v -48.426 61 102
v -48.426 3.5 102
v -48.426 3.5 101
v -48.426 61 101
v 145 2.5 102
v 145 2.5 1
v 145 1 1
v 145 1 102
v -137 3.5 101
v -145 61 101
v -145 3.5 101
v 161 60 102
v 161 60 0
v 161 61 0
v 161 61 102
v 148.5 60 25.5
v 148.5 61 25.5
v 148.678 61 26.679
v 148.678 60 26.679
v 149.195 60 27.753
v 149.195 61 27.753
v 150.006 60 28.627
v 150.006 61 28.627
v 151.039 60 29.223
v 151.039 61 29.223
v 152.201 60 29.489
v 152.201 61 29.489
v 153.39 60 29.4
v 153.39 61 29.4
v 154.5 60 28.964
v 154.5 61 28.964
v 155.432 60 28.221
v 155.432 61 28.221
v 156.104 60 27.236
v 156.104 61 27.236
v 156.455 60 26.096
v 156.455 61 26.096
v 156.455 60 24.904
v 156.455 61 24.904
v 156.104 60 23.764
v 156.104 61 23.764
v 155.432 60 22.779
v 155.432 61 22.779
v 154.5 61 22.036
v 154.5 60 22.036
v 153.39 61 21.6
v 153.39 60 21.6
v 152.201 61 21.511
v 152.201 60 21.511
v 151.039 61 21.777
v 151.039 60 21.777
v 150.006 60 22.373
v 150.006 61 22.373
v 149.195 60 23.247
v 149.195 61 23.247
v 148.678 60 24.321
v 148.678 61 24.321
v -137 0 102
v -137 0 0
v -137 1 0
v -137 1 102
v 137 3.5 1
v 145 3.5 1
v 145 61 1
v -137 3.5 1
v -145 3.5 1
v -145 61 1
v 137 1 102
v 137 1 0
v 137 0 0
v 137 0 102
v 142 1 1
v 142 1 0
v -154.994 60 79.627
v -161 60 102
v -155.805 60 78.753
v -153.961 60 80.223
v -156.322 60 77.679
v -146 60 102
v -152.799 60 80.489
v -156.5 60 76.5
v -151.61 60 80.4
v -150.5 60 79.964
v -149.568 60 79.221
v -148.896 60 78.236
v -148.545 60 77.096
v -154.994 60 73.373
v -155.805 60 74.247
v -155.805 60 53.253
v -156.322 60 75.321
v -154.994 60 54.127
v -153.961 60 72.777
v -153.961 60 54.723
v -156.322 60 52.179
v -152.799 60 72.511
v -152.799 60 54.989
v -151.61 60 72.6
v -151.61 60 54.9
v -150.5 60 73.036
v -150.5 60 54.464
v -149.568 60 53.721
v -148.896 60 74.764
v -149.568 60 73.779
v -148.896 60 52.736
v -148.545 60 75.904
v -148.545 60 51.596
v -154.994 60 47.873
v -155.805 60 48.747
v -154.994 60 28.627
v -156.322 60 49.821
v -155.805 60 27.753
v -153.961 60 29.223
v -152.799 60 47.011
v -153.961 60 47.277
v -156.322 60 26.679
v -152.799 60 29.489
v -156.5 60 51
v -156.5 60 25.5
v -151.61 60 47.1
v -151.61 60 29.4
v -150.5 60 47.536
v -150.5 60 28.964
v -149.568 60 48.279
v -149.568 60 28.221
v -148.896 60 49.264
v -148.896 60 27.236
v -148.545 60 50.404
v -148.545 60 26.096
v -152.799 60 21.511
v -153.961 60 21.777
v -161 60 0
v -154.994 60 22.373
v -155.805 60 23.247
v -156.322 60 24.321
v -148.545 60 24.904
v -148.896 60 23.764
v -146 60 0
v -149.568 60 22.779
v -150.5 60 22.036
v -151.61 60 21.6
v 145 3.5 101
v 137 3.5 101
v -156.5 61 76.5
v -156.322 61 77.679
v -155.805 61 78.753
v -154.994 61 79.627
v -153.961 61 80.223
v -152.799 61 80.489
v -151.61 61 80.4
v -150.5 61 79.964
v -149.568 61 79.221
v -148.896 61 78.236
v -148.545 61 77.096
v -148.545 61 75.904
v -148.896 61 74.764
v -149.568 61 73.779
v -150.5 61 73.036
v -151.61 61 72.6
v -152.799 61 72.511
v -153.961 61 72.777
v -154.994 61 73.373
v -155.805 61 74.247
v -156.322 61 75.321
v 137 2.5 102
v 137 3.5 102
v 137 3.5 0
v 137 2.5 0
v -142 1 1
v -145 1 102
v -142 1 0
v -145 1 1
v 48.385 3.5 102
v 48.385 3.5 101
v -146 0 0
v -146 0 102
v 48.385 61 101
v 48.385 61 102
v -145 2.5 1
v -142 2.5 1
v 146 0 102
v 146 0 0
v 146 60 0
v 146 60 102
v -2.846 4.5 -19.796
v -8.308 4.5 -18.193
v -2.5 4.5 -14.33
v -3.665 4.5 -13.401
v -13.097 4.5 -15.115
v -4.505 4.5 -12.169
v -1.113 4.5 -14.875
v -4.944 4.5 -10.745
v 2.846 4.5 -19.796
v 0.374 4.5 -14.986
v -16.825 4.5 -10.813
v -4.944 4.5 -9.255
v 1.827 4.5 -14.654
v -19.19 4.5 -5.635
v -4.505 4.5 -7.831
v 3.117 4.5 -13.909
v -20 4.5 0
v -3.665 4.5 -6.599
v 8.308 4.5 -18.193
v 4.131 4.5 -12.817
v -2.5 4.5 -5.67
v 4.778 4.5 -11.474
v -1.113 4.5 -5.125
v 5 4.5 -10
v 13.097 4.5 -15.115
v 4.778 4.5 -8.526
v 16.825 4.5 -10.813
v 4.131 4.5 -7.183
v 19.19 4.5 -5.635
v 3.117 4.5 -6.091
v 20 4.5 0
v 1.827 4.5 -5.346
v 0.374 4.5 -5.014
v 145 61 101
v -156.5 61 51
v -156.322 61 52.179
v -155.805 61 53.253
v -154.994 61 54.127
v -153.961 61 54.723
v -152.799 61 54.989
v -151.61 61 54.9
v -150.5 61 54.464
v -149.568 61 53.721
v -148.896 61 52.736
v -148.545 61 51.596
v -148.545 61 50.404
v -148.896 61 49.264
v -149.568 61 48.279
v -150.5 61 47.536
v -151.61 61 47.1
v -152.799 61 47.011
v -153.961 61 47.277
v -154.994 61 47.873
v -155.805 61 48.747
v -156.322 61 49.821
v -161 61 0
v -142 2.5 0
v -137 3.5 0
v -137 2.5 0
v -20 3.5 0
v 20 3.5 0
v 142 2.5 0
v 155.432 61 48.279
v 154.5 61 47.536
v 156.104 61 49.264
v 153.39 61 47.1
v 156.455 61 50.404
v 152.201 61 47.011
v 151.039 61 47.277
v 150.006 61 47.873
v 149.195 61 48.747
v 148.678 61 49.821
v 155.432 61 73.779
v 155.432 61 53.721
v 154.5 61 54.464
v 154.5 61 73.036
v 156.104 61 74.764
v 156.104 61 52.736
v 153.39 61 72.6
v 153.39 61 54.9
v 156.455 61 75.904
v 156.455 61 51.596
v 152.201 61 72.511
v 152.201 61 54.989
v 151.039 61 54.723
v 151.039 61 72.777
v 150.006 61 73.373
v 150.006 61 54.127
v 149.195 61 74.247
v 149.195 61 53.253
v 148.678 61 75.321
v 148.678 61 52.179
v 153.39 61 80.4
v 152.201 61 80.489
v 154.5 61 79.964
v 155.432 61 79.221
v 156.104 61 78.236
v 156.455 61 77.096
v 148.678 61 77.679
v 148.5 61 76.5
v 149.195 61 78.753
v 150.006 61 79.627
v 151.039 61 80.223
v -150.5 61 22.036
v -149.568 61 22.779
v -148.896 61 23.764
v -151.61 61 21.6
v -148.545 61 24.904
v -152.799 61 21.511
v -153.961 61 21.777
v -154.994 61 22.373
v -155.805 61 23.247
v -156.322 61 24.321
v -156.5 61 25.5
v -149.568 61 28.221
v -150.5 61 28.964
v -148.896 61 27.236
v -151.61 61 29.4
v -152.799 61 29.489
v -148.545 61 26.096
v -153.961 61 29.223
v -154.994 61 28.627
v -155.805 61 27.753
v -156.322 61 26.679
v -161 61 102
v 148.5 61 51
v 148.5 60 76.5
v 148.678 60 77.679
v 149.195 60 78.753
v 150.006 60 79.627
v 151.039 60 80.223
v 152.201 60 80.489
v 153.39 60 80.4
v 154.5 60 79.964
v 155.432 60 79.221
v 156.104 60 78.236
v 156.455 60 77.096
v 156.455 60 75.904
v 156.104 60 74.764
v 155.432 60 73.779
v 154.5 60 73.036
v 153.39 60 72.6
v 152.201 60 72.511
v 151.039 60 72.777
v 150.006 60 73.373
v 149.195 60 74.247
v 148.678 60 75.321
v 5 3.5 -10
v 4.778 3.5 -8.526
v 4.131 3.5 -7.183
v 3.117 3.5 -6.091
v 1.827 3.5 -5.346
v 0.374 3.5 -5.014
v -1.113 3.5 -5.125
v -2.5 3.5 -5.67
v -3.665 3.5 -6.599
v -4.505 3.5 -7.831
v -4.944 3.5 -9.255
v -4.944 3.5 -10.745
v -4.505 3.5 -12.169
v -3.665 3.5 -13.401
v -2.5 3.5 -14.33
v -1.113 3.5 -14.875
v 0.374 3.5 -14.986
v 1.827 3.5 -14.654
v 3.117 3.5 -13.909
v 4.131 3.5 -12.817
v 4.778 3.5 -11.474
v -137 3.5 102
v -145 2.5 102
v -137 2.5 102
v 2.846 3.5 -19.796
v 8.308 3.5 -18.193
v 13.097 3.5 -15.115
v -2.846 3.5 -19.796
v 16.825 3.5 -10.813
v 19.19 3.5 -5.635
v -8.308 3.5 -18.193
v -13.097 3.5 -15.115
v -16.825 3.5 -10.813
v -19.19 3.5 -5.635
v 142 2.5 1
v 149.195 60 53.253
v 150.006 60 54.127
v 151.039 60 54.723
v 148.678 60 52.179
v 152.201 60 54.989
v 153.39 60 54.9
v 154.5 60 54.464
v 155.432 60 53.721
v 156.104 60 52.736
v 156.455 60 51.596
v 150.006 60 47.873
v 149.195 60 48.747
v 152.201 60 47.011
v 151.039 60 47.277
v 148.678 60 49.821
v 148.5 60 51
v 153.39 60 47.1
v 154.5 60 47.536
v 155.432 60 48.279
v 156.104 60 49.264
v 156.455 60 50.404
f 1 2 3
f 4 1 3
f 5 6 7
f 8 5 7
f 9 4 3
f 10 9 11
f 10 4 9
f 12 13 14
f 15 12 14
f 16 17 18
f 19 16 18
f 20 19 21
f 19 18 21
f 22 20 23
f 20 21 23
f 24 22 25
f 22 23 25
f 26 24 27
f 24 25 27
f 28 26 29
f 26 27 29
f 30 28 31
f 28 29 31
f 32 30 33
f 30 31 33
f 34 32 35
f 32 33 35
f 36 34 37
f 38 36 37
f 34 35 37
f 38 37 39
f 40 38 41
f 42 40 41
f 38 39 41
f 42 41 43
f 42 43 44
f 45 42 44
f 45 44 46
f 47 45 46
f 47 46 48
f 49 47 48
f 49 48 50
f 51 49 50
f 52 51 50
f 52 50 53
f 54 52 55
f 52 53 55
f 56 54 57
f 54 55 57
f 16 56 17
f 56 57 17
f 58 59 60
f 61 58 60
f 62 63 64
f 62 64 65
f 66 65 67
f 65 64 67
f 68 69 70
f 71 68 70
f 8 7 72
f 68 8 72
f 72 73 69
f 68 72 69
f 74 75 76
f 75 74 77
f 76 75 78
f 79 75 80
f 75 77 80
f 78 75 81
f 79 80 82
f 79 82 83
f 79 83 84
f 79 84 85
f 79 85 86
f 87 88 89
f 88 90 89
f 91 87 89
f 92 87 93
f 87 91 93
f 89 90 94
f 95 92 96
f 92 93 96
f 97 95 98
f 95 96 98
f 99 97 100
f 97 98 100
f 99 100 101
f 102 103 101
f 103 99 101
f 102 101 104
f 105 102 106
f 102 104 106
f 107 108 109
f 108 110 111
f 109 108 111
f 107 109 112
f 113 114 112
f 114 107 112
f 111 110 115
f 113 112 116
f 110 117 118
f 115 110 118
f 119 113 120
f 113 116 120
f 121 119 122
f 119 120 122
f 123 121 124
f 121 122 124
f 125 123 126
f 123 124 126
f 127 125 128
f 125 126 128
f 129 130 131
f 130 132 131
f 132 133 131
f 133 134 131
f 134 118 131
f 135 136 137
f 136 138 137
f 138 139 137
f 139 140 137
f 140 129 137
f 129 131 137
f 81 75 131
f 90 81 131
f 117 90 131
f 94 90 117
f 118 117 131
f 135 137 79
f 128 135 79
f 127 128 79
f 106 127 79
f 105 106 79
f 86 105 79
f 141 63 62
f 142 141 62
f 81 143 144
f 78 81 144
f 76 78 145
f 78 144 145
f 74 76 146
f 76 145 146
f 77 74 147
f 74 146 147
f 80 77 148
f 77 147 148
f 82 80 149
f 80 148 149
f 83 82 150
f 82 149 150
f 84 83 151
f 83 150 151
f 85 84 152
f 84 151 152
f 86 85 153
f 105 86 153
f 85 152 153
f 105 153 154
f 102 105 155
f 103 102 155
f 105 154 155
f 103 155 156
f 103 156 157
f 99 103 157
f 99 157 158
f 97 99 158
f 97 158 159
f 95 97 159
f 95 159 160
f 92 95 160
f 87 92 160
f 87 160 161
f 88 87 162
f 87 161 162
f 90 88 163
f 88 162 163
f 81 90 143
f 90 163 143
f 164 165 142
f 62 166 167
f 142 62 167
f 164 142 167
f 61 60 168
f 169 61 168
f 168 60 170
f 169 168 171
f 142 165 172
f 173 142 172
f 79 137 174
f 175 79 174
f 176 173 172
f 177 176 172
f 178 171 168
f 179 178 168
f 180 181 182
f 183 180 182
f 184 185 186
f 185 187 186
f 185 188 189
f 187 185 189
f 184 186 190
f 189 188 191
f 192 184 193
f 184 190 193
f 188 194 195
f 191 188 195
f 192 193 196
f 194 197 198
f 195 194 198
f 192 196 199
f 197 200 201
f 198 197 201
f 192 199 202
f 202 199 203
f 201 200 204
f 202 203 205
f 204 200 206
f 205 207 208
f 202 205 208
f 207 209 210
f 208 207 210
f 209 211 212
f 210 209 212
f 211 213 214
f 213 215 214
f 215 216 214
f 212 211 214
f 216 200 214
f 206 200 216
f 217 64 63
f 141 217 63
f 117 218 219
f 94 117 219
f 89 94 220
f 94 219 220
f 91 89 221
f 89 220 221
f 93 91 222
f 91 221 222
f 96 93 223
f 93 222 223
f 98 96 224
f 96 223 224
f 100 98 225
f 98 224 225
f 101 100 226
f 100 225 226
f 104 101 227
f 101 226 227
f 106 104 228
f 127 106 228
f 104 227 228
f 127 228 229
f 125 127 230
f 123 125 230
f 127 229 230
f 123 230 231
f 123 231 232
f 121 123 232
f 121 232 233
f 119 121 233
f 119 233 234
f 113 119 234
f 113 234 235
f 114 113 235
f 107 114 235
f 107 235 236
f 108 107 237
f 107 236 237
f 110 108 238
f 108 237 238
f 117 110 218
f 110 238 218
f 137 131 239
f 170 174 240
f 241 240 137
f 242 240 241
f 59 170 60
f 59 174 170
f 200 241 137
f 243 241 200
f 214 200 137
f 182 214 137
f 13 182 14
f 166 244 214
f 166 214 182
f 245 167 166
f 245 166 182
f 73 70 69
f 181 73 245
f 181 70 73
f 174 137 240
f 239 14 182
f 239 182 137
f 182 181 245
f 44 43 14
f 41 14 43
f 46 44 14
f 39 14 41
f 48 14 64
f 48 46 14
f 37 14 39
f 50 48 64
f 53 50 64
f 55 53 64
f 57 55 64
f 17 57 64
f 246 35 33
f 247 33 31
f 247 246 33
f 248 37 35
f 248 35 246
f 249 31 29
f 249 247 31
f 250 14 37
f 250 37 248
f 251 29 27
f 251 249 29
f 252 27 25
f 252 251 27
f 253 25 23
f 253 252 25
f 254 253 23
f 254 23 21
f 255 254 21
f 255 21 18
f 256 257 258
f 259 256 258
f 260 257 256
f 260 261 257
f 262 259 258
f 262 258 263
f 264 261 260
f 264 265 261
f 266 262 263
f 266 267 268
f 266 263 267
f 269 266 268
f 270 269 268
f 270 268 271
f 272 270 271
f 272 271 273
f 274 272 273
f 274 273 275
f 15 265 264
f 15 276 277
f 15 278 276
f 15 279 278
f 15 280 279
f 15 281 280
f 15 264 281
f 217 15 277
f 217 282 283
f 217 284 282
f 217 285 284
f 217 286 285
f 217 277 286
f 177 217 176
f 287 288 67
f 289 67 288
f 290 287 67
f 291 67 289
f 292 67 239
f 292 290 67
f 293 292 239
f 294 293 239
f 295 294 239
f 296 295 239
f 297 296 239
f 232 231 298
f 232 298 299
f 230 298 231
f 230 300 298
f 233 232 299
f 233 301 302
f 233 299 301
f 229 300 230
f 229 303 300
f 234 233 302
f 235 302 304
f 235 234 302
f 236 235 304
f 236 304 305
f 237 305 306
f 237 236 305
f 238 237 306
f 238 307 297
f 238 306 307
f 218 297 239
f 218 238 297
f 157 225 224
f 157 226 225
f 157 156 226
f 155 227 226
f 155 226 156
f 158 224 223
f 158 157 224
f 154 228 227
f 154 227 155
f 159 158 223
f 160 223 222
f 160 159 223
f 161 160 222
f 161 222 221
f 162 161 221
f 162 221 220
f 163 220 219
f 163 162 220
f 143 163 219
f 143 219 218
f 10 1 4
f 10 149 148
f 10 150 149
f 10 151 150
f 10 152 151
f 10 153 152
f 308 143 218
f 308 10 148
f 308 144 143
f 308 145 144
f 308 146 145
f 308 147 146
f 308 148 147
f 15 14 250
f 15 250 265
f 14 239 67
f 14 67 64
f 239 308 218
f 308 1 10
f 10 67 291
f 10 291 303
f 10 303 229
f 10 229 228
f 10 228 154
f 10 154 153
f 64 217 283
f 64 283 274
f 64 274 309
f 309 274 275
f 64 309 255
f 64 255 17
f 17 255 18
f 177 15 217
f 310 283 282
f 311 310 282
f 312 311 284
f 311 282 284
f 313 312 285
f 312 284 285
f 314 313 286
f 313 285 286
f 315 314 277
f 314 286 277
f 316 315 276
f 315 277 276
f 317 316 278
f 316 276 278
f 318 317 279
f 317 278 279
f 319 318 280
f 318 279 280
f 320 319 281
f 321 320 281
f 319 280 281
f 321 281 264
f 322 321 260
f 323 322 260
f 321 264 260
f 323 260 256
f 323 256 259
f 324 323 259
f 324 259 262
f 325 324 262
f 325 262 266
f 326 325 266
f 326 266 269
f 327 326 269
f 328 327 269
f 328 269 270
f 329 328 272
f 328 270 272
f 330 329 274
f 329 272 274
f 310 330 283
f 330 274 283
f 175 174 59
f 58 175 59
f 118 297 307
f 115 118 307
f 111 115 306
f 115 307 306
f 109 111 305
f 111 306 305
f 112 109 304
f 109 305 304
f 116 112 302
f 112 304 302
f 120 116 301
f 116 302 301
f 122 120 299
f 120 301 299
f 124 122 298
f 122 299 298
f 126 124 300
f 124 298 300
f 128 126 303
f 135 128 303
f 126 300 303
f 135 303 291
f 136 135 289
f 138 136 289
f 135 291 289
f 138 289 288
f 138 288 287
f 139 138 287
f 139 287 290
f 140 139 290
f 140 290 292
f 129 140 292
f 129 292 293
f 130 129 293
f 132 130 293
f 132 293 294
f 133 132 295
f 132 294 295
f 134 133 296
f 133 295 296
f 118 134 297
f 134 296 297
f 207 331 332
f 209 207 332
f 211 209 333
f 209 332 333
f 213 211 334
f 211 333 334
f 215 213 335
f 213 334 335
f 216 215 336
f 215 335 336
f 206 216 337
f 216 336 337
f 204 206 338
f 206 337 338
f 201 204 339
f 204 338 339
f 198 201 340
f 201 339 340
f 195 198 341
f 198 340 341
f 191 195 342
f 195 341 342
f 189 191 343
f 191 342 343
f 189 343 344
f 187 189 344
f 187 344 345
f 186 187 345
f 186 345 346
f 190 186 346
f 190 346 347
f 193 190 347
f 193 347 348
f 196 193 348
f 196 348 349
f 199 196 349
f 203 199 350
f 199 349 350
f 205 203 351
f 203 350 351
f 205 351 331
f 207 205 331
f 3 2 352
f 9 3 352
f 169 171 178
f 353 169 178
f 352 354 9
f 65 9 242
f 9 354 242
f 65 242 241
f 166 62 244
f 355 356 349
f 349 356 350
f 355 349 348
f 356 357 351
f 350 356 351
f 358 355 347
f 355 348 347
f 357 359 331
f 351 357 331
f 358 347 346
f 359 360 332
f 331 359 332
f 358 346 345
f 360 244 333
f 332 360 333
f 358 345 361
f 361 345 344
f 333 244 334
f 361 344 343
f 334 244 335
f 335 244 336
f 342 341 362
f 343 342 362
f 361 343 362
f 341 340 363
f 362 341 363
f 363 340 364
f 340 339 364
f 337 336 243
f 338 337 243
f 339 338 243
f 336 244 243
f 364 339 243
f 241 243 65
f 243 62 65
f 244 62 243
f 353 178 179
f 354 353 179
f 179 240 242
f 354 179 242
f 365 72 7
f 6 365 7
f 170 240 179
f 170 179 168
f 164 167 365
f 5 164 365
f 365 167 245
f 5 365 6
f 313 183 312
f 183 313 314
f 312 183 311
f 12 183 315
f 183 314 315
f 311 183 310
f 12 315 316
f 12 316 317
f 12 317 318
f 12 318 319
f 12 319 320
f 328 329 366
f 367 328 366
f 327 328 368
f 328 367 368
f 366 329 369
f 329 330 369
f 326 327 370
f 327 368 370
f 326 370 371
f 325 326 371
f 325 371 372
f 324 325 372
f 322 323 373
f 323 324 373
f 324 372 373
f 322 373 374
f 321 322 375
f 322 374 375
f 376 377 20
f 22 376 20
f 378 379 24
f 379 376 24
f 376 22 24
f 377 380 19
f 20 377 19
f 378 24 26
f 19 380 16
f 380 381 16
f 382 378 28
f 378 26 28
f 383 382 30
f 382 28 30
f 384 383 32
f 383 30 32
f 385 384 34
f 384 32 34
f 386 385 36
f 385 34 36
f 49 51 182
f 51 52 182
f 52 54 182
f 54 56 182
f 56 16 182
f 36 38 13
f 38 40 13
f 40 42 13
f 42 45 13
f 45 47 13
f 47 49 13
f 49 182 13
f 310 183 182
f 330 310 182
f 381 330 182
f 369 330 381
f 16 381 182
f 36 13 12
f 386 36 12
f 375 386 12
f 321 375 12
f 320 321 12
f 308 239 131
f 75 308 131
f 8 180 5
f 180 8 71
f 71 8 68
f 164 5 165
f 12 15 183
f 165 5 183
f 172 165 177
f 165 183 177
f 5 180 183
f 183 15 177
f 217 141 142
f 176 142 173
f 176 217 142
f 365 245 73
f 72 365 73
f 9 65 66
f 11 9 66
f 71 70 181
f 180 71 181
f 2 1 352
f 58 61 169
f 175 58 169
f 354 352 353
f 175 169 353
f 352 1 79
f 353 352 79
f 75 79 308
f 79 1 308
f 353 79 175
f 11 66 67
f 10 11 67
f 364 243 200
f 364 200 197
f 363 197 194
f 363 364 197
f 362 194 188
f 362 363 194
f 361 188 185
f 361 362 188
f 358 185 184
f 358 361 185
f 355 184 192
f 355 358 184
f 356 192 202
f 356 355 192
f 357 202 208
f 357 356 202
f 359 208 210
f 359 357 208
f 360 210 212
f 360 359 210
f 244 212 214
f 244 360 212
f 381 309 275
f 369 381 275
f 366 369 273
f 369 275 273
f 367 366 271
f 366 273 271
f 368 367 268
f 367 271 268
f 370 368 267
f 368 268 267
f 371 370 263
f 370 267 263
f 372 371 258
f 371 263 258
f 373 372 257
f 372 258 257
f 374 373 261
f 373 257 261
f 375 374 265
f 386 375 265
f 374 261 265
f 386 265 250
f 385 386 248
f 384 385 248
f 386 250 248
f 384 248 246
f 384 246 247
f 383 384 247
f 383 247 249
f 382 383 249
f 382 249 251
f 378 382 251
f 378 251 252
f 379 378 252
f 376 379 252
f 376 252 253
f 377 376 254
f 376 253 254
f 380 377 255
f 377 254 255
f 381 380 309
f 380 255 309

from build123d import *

# Parameters (mm, degrees)
F1_DEPTH  = 102
F2_W      = 290
F2_H      = 1
F3_DEPTH  = 57.5
F2_R      = 4
F4_DEPTH  = 1
F5_W      = 3
F5_H      = 1.5
F6_DEPTH  = 1
F7_R      = 5
F8_DEPTH  = 1
F10_DEPTH = 61


with BuildPart() as f1:
    # F0 (on Top) → F1 (new body)
    with BuildSketch(Plane.XY):
        Polygon((-146, 60), (-146, 0), (-137, 0), (-137, 1), (-145, 1), (-145, 2.5), (-137, 2.5), (-137, 3.5), (-145, 3.5), (-145, 61), (-161, 61), (-161, 60), align=None)
    extrude(amount=F1_DEPTH)



with BuildPart() as f1b:
    # F0 (on Top) → F1, piece 2 (new body)
    with BuildSketch(Plane.XY):
        Polygon((137, 1), (137, 0), (146, 0), (146, 60), (161, 60), (161, 61), (145, 61), (145, 3.5), (137, 3.5), (137, 2.5), (145, 2.5), (145, 1), align=None)
    extrude(amount=F1_DEPTH)


with BuildPart() as f1_1:
    add(f1.part)

    add(f1b.part)  # F3 merges F1b
    # F2 (on face) → F3 (join)
    with BuildSketch(Plane(origin=(0, 61, 0), x_dir=(-1, 0, 0), z_dir=(0, 1, 0))):
        with Locations((0, 101.5)):
            Rectangle(F2_W, F2_H)
        with Locations((0, 0.5)):
            Rectangle(F2_W, F2_H)
    extrude(amount=-F3_DEPTH)

    # F2 (on face) → F4 (cut, through all)
    with BuildSketch(Plane(origin=(0, 61, 0), x_dir=(-1, 0, 0), z_dir=(0, 1, 0))):
        with Locations((-152.5, 76.5)):
            Circle(F2_R)
        with Locations((-152.5, 51)):
            Circle(F2_R)
        with Locations((-152.5, 25.5)):
            Circle(F2_R)
        with Locations((152.5, 76.5)):
            Circle(F2_R)
        with Locations((152.5, 51)):
            Circle(F2_R)
        with Locations((152.5, 25.5)):
            Circle(F2_R)
    extrude(amount=-F4_DEPTH, mode=Mode.SUBTRACT)

    # F5 (on face) → F6 (join)
    with BuildSketch(Plane(origin=(0, 0, 0), x_dir=(1, 0, 0), z_dir=(0, 0, -1))):
        with Locations((-143.5, -1.75)):
            Rectangle(F5_W, F5_H)
        with Locations((143.5, -1.75)):
            Rectangle(F5_W, F5_H)
    extrude(amount=-F6_DEPTH)

    # F7 (on face) → F8 (join)
    with BuildSketch(Plane.XZ.offset(-3.5)):
        with BuildLine():
            Line((20, 0), (-20, 0))
            ThreePointArc((-20, 0), (0, -20), (20, 0))
        make_face()
        with Locations((0, -10)):
            Circle(F7_R, mode=Mode.SUBTRACT)
    extrude(amount=-F8_DEPTH)

    # F9 (on Front) → F10 (cut)
    with BuildSketch(Plane.XZ):
        Polygon((48.3850128949, 102.0231251585), (-48.4258194991, 102.1056490811), (-48.4258194991, 100.3182497944), (48.3850128949, 100.3182497944), align=None)
    extrude(amount=-F10_DEPTH, mode=Mode.SUBTRACT)


solid = f1_1.part
